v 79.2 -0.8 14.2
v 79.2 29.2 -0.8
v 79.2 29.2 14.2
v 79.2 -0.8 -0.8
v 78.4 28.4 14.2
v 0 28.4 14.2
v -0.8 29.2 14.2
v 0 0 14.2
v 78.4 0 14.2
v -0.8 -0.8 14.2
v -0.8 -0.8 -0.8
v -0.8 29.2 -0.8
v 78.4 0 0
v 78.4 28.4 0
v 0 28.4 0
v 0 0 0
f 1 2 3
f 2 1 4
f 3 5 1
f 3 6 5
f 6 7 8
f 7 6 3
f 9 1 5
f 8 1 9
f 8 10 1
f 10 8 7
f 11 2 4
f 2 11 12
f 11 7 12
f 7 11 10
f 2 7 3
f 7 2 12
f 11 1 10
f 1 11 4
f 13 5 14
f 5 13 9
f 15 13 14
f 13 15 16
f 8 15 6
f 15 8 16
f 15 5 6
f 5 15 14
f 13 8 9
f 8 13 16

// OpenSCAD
wall=0.8;
width=30;
length=80;
height=15;

difference() {
  translate([-wall,-wall,-wall]) cube([length,width,height]);
  translate([0,0,0]) cube([length-2*wall,width-2*wall,height]);
}
